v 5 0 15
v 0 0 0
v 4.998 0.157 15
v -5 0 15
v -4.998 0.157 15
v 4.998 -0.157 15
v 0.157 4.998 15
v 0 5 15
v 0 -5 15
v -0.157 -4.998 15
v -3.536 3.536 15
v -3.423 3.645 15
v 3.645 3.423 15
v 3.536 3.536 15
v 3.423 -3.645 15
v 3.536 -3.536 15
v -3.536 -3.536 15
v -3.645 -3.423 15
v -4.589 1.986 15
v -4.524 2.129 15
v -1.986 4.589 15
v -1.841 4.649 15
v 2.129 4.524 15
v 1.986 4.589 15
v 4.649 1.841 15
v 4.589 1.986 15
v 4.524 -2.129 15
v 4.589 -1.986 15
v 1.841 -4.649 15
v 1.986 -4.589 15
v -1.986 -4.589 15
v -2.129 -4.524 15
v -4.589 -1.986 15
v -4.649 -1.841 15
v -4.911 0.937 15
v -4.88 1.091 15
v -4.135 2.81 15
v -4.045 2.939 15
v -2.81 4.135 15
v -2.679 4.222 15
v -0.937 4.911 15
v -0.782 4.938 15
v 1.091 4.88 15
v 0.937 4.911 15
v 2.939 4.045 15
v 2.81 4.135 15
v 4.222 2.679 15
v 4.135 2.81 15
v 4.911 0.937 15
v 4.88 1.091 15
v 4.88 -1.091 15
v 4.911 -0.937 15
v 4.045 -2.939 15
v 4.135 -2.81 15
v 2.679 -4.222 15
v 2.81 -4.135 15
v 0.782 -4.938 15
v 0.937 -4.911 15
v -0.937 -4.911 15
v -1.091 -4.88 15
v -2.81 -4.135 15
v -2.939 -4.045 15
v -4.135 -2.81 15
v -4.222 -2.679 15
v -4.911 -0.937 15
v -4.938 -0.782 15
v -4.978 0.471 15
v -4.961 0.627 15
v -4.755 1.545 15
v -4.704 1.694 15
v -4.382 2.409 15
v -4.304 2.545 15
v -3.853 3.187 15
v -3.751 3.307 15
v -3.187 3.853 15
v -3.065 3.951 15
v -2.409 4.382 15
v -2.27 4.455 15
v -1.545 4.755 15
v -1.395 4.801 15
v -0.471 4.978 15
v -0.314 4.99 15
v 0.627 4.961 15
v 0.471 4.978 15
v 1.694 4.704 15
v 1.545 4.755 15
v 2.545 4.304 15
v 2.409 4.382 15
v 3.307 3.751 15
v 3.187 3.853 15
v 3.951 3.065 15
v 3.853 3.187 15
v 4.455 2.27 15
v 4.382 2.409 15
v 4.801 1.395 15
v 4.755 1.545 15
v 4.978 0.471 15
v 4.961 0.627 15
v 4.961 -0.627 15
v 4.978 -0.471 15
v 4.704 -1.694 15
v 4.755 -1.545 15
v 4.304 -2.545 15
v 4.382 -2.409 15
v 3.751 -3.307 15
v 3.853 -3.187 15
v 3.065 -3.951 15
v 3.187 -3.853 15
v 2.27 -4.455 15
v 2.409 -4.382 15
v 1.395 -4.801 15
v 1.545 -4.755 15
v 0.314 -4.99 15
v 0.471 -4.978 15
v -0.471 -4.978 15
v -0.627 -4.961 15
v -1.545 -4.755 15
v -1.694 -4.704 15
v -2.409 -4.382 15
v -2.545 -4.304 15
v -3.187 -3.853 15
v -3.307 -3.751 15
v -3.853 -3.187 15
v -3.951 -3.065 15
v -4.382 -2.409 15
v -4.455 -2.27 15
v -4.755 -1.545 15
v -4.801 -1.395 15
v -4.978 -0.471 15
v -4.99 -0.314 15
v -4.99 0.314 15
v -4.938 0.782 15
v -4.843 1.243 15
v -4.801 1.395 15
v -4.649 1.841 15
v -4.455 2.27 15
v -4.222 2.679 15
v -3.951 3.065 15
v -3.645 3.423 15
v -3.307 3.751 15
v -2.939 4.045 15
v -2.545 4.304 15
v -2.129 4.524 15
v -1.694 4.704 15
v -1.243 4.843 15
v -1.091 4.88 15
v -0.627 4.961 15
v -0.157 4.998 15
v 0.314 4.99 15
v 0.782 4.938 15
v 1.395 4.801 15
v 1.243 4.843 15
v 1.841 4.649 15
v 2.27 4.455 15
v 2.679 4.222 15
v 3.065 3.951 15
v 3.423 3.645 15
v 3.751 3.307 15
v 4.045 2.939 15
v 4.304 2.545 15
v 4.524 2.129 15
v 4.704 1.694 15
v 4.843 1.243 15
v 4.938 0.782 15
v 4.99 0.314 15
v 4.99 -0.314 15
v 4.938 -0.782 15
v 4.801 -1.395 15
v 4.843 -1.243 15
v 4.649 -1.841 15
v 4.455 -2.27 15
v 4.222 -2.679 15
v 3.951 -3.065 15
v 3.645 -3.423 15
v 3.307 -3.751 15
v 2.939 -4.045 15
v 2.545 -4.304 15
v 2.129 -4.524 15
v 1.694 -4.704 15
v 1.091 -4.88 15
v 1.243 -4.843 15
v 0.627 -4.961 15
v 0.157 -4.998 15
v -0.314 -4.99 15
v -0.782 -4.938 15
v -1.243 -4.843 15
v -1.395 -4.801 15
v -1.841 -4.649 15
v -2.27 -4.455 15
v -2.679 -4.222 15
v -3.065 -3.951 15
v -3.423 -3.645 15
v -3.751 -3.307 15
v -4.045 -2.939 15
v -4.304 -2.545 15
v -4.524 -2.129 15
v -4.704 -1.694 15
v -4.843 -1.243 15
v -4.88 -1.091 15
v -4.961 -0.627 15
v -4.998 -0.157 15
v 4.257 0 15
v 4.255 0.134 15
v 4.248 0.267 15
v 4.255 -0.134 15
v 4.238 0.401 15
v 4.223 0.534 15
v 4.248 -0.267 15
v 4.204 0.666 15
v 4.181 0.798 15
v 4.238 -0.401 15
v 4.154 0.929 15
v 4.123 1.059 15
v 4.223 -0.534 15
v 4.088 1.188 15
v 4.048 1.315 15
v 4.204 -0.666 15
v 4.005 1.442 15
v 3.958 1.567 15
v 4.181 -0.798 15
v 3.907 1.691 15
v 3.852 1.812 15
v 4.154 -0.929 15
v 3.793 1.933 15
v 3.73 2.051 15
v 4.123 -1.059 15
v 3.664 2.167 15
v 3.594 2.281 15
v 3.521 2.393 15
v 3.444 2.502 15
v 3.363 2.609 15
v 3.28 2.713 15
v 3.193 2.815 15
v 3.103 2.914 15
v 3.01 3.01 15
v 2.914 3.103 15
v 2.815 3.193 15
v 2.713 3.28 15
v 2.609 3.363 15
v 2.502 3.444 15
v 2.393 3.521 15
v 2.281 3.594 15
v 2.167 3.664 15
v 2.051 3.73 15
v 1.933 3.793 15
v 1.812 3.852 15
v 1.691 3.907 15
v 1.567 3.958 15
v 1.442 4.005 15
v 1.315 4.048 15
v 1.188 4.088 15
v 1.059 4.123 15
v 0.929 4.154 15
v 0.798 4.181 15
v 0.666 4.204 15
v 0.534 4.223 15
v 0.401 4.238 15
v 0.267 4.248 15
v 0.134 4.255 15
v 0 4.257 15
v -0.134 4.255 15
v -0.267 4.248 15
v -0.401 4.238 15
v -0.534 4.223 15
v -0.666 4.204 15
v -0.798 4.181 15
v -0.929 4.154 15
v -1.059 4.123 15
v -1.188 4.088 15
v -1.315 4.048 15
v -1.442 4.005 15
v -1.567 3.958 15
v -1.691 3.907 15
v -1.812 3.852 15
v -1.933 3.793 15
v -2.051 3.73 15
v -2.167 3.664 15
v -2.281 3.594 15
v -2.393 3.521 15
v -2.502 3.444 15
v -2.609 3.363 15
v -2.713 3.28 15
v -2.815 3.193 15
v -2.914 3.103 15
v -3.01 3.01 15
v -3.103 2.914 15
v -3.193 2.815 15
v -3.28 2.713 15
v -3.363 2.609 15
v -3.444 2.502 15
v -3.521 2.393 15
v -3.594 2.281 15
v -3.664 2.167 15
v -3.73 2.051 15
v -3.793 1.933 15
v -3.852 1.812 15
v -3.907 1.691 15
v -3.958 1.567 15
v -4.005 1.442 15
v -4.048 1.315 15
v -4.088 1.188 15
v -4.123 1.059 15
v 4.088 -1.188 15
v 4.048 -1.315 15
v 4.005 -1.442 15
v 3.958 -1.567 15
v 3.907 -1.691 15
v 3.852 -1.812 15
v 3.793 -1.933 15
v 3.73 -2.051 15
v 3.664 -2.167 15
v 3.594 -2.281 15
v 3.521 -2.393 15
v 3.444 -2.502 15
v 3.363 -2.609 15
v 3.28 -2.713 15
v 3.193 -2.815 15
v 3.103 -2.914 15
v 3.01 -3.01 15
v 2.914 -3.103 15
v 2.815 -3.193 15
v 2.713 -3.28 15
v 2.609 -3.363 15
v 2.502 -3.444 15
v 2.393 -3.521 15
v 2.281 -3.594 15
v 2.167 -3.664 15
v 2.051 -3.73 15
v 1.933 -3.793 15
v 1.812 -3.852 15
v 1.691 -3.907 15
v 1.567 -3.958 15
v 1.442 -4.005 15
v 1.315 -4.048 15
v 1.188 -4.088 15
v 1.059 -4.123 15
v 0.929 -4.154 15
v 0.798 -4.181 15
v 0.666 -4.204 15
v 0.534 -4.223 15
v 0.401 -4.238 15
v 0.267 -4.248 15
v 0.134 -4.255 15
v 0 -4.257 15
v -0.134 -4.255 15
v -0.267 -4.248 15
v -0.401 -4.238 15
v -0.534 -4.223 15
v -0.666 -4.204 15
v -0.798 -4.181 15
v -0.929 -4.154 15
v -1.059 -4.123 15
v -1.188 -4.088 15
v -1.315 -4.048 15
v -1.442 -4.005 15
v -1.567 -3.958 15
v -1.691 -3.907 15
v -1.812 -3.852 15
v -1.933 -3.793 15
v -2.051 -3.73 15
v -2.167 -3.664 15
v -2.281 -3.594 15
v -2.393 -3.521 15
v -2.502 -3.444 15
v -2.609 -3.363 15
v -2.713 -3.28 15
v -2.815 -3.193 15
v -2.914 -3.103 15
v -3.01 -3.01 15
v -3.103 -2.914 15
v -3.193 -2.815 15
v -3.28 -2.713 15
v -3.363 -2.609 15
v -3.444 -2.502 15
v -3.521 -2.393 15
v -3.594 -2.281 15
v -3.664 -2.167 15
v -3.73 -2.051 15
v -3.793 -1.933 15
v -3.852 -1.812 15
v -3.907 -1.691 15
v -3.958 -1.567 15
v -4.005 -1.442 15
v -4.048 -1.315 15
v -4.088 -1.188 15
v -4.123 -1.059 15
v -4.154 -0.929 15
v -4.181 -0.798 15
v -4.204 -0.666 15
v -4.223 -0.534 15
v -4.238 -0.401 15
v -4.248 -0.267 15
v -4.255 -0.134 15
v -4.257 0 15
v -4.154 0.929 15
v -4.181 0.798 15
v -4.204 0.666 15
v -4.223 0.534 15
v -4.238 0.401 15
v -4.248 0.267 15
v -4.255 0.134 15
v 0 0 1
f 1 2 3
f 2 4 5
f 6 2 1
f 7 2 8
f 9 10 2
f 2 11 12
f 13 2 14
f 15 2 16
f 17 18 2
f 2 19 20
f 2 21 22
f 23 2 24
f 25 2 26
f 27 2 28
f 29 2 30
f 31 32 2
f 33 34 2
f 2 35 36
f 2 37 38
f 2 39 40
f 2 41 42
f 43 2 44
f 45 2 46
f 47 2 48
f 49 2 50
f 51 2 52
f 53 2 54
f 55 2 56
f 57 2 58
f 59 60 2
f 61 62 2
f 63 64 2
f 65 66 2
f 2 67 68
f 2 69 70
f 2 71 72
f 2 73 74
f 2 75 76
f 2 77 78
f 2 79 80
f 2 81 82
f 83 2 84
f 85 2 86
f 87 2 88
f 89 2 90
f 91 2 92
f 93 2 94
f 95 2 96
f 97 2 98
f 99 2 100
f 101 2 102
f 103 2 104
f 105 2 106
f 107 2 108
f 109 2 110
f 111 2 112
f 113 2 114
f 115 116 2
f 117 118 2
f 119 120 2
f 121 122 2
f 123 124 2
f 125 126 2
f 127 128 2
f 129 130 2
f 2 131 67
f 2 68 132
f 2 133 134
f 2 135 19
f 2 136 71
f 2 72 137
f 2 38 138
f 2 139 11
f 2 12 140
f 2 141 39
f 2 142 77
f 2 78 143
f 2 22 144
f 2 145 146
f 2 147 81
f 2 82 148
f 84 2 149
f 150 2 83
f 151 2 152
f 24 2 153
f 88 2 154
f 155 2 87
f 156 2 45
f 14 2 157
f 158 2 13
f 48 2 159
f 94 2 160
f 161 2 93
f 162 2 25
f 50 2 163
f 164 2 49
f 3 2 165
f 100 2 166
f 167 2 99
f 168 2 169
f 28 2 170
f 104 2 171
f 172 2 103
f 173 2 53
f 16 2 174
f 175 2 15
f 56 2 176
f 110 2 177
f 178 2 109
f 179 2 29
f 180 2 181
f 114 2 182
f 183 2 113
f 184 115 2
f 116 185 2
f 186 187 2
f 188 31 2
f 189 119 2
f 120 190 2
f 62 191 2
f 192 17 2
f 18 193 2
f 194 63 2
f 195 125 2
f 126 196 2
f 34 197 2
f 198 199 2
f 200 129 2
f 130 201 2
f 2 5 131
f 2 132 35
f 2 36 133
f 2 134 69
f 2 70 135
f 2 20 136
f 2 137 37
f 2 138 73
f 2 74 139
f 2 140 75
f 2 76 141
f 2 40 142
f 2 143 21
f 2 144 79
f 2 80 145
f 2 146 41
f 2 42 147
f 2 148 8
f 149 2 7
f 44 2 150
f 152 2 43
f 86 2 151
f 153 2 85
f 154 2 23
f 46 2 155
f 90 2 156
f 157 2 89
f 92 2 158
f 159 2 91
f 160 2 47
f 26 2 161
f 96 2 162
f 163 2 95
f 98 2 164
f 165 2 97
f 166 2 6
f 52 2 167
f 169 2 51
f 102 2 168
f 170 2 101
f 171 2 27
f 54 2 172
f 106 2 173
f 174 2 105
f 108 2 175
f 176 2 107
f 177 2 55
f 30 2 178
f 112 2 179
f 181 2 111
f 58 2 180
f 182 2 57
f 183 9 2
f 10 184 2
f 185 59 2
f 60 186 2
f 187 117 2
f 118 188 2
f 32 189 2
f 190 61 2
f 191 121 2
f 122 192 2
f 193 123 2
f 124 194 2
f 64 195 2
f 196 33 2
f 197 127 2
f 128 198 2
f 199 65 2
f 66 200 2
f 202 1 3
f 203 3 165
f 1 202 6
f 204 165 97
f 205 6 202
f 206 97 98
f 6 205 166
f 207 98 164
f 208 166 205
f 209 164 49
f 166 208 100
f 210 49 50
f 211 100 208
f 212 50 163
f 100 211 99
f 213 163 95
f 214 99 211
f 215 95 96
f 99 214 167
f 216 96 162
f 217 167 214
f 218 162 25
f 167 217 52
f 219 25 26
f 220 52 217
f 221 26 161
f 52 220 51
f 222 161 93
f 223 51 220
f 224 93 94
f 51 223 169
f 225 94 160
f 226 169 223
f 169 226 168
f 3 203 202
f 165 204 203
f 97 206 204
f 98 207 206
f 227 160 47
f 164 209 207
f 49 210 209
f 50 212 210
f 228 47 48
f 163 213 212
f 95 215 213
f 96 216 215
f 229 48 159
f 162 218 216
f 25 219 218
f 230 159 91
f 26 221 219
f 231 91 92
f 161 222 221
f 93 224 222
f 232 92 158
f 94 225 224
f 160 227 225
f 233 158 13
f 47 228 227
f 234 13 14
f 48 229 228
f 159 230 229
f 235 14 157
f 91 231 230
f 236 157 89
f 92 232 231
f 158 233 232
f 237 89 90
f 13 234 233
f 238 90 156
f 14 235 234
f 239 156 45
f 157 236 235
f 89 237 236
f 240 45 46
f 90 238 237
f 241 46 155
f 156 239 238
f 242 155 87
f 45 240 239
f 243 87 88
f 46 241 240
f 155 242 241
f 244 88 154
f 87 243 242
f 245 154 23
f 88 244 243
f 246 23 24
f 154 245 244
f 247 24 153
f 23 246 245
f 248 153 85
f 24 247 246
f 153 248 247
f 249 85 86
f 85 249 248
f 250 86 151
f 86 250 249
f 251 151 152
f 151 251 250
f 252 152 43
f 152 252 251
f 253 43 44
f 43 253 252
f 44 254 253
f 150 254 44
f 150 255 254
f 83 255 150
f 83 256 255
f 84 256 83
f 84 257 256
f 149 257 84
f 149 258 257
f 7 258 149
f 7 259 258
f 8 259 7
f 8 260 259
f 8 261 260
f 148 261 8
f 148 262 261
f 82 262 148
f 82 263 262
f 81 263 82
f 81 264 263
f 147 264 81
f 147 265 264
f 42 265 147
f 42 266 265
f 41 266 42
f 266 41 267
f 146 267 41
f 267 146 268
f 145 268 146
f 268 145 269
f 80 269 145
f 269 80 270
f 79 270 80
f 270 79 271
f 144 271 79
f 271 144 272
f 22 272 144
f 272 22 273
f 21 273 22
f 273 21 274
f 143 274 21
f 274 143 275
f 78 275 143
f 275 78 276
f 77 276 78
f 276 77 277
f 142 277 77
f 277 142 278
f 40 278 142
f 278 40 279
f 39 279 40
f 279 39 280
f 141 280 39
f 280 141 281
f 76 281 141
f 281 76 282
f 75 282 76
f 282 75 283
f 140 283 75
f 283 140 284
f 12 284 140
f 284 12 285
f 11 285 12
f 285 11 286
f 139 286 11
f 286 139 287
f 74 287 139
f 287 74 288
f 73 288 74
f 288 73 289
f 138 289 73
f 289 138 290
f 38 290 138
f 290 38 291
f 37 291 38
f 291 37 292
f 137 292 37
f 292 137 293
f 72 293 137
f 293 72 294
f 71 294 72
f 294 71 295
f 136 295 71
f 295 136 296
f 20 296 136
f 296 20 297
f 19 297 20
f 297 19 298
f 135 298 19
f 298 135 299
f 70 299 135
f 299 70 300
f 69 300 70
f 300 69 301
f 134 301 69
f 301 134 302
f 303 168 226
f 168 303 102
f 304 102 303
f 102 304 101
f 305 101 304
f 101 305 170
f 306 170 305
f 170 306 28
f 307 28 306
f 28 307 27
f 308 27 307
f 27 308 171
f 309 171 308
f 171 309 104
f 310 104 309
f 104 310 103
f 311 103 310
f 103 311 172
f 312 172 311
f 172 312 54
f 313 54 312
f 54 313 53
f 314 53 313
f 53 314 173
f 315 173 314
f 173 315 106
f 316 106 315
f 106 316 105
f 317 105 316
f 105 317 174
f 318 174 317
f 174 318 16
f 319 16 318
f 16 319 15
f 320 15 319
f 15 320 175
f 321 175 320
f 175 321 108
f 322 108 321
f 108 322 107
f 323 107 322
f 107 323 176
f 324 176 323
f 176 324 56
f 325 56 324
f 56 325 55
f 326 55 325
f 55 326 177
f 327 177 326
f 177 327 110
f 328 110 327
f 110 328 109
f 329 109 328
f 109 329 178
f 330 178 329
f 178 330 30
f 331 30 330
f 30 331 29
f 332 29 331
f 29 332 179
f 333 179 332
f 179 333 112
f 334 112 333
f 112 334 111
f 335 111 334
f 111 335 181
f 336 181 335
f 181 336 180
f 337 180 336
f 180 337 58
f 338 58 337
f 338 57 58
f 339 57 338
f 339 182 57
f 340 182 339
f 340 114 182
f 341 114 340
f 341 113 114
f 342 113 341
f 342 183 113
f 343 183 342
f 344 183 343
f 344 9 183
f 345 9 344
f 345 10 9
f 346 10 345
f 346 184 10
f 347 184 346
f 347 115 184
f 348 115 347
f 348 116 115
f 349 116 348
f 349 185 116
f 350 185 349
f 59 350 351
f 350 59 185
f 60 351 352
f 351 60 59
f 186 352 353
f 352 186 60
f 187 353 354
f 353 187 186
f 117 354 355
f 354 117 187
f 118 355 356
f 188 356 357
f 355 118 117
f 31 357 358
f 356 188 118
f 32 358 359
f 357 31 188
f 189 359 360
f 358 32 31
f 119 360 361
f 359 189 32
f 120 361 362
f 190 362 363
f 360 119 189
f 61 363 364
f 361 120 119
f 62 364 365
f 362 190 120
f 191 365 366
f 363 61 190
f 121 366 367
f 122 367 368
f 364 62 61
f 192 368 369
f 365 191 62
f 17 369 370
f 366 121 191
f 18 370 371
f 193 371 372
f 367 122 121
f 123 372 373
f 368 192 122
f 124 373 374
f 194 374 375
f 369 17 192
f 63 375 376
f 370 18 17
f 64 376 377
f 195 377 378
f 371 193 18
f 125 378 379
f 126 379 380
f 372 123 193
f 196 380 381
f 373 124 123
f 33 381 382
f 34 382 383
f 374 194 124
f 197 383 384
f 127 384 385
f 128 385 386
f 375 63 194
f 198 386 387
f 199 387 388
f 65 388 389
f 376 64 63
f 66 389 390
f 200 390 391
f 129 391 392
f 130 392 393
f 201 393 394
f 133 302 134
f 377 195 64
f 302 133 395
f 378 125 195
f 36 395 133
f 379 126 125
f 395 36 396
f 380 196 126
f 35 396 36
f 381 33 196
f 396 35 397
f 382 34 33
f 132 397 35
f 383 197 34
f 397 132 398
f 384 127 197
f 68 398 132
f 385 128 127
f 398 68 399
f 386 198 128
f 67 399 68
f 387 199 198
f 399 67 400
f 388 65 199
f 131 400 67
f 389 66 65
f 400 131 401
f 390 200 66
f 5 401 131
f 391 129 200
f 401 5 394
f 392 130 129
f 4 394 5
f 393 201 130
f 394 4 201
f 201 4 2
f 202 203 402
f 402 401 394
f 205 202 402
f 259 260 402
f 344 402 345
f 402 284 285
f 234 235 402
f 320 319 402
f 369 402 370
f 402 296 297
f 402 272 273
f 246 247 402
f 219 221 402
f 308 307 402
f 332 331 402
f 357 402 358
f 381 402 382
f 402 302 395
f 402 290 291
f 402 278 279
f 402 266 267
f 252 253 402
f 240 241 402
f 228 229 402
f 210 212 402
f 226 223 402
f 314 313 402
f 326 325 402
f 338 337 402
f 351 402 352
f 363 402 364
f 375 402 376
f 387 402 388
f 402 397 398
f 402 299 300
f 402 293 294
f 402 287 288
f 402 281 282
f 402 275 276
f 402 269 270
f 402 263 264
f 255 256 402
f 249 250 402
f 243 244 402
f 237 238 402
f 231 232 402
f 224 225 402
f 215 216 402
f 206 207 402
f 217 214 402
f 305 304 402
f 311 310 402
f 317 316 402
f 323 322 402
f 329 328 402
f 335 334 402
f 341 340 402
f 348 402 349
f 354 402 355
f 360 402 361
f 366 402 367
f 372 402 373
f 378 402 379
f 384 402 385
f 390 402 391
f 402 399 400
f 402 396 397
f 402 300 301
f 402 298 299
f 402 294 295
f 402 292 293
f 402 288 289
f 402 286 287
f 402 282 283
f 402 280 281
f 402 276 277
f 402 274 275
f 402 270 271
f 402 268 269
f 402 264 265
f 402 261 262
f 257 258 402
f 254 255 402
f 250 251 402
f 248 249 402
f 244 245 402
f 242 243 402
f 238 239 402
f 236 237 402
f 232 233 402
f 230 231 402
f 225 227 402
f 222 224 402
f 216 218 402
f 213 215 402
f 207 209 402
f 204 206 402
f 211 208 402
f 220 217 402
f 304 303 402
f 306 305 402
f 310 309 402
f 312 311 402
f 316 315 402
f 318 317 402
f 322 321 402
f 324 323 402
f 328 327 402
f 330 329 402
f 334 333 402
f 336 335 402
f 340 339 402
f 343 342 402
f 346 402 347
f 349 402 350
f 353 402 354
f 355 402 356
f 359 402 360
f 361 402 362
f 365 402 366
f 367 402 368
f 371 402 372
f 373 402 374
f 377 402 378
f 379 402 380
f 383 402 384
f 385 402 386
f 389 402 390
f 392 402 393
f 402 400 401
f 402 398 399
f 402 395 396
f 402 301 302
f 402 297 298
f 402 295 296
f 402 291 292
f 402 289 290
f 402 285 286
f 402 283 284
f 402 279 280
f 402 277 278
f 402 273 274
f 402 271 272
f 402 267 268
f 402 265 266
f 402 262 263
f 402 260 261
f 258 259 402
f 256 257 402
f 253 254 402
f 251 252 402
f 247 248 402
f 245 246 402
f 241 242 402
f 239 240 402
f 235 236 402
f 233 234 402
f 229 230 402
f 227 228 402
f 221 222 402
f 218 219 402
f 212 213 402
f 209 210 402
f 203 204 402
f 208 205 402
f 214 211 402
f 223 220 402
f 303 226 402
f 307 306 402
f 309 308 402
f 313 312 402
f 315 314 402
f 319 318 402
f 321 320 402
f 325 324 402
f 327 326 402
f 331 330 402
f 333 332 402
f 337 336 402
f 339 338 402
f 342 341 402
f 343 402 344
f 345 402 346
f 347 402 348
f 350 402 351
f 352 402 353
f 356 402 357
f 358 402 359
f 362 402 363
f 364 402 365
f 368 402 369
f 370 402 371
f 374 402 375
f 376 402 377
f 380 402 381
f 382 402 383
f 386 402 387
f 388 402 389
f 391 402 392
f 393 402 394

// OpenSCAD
$fn = 200;
difference () {
    cylinder(h = 15, r1 = 0, r2 = 5);
    translate ([0,0,1])
    cylinder(h = 14.8,r1 = 0,r2 = 4.5);
 
}
